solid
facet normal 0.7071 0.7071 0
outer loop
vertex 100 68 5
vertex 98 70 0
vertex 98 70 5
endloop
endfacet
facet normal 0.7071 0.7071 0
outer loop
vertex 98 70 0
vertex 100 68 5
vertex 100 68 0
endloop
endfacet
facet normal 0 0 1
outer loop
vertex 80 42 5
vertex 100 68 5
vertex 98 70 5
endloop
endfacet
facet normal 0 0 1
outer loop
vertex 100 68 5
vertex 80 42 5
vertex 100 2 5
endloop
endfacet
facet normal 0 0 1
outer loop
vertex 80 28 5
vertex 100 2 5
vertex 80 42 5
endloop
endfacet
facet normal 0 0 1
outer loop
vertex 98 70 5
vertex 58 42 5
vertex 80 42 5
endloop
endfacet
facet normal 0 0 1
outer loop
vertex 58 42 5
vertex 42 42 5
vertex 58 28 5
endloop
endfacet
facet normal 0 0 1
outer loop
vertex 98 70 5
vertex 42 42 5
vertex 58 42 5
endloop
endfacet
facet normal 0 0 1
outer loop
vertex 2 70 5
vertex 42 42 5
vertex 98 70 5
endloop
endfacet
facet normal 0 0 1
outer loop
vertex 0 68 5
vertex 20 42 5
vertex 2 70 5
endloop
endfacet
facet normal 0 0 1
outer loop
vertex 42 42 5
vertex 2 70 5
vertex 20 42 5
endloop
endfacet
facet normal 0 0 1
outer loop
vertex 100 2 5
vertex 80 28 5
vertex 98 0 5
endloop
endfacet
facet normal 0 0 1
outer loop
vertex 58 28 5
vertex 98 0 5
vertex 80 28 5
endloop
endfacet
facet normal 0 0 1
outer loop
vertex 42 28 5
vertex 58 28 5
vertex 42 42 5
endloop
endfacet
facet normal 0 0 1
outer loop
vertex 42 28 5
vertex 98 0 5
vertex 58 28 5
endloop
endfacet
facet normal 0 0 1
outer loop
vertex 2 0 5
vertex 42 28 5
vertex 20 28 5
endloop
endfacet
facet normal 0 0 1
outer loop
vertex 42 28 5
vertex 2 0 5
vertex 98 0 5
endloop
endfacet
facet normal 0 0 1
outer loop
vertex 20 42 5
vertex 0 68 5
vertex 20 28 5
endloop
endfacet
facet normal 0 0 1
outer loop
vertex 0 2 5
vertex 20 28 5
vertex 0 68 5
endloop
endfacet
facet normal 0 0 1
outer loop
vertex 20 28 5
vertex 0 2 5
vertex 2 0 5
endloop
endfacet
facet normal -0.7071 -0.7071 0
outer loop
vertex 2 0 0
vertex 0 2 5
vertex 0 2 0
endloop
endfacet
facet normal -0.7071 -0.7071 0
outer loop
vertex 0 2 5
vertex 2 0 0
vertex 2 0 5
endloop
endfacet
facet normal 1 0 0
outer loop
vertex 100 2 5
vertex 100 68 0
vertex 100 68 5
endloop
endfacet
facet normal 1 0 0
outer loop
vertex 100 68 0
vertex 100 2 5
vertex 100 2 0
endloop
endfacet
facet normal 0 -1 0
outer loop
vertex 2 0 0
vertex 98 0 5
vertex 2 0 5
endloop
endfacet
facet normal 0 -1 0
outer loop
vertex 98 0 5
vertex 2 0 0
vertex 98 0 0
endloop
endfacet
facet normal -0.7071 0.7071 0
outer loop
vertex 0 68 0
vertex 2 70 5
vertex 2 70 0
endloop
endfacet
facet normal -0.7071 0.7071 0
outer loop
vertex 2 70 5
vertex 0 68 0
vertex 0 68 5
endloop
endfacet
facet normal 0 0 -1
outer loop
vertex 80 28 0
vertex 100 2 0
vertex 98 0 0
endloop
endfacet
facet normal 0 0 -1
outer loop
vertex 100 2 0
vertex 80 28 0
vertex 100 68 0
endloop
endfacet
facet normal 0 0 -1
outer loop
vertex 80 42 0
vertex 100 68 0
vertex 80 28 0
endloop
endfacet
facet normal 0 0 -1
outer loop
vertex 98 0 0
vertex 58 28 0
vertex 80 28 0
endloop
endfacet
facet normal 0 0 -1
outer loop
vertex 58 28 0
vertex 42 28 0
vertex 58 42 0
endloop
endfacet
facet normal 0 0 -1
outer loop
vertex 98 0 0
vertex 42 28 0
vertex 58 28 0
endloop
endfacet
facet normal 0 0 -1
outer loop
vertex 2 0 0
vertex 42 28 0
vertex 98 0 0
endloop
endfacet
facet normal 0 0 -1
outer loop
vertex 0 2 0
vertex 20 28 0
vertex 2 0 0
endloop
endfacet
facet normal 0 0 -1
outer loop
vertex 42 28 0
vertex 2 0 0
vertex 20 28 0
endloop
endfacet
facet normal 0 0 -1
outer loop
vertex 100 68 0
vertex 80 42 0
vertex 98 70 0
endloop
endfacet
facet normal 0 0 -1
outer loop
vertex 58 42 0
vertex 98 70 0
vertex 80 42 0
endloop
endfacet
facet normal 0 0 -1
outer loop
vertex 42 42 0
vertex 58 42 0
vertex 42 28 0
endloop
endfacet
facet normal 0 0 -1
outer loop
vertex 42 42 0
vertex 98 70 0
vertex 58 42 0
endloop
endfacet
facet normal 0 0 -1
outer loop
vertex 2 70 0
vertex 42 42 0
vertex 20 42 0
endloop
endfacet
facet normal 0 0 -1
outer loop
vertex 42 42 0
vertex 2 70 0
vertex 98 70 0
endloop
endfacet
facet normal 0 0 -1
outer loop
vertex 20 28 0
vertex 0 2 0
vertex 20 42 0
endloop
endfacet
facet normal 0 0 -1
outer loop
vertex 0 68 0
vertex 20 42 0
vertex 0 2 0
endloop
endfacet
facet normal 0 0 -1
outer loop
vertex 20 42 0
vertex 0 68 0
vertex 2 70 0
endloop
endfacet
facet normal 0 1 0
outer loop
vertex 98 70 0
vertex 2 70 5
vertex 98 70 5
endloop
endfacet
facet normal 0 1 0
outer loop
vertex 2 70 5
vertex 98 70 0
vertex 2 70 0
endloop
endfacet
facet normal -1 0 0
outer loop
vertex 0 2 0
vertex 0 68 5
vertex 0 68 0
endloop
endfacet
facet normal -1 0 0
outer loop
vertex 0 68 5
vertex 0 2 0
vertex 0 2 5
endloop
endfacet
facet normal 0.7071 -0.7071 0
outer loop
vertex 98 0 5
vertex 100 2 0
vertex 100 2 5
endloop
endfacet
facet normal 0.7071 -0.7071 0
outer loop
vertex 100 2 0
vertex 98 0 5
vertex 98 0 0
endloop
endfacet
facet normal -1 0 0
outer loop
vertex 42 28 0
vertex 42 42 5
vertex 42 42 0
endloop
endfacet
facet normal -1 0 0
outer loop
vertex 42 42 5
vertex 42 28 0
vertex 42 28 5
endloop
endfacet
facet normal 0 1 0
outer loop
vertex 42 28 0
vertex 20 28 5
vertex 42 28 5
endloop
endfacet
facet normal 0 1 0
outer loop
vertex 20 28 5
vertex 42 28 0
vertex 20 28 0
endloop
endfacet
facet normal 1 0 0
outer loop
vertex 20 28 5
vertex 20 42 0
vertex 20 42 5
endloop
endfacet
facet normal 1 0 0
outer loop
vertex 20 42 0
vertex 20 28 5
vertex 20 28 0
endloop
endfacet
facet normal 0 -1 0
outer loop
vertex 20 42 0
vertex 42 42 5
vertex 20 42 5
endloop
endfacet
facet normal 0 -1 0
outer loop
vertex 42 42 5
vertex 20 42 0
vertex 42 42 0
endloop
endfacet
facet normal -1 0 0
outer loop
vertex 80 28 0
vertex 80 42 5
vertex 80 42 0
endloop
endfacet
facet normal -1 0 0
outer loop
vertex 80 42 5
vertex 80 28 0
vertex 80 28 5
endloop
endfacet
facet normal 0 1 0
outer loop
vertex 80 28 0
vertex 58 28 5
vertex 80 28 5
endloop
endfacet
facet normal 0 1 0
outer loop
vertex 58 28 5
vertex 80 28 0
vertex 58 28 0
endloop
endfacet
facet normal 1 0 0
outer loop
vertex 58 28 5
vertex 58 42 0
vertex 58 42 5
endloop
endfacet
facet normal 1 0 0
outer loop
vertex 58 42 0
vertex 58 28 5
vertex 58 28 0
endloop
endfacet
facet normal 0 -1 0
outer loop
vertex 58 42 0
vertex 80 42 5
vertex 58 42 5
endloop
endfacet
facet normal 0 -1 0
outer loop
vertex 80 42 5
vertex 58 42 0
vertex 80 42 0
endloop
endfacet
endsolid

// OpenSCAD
$fn = 32;

// ----------------------------------------------------------------------
// Windowed plate: 2 voids, 100 x 70 x 5 mm
// ----------------------------------------------------------------------

// --- parameters (mm) ---
plate_l = 100;            // plate length, X
plate_w = 70;             // plate width, Y
plate_t = 5;              // plate thickness, Z
edge_margin = 12;         // wall from the plate edge to any window
windows = 2;              // number of windows in the row
win_l = 22;               // window length
win_w = 14;               // window width
win_pitch = 38;           // window pitch along X
depth_1 = 5;              // depth of void 1 (full thickness = through)
depth_2 = 5;              // depth of void 2 (full thickness = through)
corner_c = 2;             // corner chamfer of the plate

profile = [[2, 0], [98, 0], [100, 2], [100, 68], [98, 70], [2, 70], [0, 68], [0, 2]];  // primary outline, 8 points, counter clockwise
void_1 = [[20, 28], [42, 28], [42, 42], [20, 42]];  // window 1 of the row, 4 points
void_2 = [[58, 28], [80, 28], [80, 42], [58, 42]];  // window 2 of the row, 4 points

// --- the one profile operation ---
difference() {
  linear_extrude(height = plate_t) polygon(points = profile);
  translate([0, 0, -1])
    linear_extrude(height = plate_t + 2) polygon(points = void_1);
  translate([0, 0, -1])
    linear_extrude(height = plate_t + 2) polygon(points = void_2);
}
